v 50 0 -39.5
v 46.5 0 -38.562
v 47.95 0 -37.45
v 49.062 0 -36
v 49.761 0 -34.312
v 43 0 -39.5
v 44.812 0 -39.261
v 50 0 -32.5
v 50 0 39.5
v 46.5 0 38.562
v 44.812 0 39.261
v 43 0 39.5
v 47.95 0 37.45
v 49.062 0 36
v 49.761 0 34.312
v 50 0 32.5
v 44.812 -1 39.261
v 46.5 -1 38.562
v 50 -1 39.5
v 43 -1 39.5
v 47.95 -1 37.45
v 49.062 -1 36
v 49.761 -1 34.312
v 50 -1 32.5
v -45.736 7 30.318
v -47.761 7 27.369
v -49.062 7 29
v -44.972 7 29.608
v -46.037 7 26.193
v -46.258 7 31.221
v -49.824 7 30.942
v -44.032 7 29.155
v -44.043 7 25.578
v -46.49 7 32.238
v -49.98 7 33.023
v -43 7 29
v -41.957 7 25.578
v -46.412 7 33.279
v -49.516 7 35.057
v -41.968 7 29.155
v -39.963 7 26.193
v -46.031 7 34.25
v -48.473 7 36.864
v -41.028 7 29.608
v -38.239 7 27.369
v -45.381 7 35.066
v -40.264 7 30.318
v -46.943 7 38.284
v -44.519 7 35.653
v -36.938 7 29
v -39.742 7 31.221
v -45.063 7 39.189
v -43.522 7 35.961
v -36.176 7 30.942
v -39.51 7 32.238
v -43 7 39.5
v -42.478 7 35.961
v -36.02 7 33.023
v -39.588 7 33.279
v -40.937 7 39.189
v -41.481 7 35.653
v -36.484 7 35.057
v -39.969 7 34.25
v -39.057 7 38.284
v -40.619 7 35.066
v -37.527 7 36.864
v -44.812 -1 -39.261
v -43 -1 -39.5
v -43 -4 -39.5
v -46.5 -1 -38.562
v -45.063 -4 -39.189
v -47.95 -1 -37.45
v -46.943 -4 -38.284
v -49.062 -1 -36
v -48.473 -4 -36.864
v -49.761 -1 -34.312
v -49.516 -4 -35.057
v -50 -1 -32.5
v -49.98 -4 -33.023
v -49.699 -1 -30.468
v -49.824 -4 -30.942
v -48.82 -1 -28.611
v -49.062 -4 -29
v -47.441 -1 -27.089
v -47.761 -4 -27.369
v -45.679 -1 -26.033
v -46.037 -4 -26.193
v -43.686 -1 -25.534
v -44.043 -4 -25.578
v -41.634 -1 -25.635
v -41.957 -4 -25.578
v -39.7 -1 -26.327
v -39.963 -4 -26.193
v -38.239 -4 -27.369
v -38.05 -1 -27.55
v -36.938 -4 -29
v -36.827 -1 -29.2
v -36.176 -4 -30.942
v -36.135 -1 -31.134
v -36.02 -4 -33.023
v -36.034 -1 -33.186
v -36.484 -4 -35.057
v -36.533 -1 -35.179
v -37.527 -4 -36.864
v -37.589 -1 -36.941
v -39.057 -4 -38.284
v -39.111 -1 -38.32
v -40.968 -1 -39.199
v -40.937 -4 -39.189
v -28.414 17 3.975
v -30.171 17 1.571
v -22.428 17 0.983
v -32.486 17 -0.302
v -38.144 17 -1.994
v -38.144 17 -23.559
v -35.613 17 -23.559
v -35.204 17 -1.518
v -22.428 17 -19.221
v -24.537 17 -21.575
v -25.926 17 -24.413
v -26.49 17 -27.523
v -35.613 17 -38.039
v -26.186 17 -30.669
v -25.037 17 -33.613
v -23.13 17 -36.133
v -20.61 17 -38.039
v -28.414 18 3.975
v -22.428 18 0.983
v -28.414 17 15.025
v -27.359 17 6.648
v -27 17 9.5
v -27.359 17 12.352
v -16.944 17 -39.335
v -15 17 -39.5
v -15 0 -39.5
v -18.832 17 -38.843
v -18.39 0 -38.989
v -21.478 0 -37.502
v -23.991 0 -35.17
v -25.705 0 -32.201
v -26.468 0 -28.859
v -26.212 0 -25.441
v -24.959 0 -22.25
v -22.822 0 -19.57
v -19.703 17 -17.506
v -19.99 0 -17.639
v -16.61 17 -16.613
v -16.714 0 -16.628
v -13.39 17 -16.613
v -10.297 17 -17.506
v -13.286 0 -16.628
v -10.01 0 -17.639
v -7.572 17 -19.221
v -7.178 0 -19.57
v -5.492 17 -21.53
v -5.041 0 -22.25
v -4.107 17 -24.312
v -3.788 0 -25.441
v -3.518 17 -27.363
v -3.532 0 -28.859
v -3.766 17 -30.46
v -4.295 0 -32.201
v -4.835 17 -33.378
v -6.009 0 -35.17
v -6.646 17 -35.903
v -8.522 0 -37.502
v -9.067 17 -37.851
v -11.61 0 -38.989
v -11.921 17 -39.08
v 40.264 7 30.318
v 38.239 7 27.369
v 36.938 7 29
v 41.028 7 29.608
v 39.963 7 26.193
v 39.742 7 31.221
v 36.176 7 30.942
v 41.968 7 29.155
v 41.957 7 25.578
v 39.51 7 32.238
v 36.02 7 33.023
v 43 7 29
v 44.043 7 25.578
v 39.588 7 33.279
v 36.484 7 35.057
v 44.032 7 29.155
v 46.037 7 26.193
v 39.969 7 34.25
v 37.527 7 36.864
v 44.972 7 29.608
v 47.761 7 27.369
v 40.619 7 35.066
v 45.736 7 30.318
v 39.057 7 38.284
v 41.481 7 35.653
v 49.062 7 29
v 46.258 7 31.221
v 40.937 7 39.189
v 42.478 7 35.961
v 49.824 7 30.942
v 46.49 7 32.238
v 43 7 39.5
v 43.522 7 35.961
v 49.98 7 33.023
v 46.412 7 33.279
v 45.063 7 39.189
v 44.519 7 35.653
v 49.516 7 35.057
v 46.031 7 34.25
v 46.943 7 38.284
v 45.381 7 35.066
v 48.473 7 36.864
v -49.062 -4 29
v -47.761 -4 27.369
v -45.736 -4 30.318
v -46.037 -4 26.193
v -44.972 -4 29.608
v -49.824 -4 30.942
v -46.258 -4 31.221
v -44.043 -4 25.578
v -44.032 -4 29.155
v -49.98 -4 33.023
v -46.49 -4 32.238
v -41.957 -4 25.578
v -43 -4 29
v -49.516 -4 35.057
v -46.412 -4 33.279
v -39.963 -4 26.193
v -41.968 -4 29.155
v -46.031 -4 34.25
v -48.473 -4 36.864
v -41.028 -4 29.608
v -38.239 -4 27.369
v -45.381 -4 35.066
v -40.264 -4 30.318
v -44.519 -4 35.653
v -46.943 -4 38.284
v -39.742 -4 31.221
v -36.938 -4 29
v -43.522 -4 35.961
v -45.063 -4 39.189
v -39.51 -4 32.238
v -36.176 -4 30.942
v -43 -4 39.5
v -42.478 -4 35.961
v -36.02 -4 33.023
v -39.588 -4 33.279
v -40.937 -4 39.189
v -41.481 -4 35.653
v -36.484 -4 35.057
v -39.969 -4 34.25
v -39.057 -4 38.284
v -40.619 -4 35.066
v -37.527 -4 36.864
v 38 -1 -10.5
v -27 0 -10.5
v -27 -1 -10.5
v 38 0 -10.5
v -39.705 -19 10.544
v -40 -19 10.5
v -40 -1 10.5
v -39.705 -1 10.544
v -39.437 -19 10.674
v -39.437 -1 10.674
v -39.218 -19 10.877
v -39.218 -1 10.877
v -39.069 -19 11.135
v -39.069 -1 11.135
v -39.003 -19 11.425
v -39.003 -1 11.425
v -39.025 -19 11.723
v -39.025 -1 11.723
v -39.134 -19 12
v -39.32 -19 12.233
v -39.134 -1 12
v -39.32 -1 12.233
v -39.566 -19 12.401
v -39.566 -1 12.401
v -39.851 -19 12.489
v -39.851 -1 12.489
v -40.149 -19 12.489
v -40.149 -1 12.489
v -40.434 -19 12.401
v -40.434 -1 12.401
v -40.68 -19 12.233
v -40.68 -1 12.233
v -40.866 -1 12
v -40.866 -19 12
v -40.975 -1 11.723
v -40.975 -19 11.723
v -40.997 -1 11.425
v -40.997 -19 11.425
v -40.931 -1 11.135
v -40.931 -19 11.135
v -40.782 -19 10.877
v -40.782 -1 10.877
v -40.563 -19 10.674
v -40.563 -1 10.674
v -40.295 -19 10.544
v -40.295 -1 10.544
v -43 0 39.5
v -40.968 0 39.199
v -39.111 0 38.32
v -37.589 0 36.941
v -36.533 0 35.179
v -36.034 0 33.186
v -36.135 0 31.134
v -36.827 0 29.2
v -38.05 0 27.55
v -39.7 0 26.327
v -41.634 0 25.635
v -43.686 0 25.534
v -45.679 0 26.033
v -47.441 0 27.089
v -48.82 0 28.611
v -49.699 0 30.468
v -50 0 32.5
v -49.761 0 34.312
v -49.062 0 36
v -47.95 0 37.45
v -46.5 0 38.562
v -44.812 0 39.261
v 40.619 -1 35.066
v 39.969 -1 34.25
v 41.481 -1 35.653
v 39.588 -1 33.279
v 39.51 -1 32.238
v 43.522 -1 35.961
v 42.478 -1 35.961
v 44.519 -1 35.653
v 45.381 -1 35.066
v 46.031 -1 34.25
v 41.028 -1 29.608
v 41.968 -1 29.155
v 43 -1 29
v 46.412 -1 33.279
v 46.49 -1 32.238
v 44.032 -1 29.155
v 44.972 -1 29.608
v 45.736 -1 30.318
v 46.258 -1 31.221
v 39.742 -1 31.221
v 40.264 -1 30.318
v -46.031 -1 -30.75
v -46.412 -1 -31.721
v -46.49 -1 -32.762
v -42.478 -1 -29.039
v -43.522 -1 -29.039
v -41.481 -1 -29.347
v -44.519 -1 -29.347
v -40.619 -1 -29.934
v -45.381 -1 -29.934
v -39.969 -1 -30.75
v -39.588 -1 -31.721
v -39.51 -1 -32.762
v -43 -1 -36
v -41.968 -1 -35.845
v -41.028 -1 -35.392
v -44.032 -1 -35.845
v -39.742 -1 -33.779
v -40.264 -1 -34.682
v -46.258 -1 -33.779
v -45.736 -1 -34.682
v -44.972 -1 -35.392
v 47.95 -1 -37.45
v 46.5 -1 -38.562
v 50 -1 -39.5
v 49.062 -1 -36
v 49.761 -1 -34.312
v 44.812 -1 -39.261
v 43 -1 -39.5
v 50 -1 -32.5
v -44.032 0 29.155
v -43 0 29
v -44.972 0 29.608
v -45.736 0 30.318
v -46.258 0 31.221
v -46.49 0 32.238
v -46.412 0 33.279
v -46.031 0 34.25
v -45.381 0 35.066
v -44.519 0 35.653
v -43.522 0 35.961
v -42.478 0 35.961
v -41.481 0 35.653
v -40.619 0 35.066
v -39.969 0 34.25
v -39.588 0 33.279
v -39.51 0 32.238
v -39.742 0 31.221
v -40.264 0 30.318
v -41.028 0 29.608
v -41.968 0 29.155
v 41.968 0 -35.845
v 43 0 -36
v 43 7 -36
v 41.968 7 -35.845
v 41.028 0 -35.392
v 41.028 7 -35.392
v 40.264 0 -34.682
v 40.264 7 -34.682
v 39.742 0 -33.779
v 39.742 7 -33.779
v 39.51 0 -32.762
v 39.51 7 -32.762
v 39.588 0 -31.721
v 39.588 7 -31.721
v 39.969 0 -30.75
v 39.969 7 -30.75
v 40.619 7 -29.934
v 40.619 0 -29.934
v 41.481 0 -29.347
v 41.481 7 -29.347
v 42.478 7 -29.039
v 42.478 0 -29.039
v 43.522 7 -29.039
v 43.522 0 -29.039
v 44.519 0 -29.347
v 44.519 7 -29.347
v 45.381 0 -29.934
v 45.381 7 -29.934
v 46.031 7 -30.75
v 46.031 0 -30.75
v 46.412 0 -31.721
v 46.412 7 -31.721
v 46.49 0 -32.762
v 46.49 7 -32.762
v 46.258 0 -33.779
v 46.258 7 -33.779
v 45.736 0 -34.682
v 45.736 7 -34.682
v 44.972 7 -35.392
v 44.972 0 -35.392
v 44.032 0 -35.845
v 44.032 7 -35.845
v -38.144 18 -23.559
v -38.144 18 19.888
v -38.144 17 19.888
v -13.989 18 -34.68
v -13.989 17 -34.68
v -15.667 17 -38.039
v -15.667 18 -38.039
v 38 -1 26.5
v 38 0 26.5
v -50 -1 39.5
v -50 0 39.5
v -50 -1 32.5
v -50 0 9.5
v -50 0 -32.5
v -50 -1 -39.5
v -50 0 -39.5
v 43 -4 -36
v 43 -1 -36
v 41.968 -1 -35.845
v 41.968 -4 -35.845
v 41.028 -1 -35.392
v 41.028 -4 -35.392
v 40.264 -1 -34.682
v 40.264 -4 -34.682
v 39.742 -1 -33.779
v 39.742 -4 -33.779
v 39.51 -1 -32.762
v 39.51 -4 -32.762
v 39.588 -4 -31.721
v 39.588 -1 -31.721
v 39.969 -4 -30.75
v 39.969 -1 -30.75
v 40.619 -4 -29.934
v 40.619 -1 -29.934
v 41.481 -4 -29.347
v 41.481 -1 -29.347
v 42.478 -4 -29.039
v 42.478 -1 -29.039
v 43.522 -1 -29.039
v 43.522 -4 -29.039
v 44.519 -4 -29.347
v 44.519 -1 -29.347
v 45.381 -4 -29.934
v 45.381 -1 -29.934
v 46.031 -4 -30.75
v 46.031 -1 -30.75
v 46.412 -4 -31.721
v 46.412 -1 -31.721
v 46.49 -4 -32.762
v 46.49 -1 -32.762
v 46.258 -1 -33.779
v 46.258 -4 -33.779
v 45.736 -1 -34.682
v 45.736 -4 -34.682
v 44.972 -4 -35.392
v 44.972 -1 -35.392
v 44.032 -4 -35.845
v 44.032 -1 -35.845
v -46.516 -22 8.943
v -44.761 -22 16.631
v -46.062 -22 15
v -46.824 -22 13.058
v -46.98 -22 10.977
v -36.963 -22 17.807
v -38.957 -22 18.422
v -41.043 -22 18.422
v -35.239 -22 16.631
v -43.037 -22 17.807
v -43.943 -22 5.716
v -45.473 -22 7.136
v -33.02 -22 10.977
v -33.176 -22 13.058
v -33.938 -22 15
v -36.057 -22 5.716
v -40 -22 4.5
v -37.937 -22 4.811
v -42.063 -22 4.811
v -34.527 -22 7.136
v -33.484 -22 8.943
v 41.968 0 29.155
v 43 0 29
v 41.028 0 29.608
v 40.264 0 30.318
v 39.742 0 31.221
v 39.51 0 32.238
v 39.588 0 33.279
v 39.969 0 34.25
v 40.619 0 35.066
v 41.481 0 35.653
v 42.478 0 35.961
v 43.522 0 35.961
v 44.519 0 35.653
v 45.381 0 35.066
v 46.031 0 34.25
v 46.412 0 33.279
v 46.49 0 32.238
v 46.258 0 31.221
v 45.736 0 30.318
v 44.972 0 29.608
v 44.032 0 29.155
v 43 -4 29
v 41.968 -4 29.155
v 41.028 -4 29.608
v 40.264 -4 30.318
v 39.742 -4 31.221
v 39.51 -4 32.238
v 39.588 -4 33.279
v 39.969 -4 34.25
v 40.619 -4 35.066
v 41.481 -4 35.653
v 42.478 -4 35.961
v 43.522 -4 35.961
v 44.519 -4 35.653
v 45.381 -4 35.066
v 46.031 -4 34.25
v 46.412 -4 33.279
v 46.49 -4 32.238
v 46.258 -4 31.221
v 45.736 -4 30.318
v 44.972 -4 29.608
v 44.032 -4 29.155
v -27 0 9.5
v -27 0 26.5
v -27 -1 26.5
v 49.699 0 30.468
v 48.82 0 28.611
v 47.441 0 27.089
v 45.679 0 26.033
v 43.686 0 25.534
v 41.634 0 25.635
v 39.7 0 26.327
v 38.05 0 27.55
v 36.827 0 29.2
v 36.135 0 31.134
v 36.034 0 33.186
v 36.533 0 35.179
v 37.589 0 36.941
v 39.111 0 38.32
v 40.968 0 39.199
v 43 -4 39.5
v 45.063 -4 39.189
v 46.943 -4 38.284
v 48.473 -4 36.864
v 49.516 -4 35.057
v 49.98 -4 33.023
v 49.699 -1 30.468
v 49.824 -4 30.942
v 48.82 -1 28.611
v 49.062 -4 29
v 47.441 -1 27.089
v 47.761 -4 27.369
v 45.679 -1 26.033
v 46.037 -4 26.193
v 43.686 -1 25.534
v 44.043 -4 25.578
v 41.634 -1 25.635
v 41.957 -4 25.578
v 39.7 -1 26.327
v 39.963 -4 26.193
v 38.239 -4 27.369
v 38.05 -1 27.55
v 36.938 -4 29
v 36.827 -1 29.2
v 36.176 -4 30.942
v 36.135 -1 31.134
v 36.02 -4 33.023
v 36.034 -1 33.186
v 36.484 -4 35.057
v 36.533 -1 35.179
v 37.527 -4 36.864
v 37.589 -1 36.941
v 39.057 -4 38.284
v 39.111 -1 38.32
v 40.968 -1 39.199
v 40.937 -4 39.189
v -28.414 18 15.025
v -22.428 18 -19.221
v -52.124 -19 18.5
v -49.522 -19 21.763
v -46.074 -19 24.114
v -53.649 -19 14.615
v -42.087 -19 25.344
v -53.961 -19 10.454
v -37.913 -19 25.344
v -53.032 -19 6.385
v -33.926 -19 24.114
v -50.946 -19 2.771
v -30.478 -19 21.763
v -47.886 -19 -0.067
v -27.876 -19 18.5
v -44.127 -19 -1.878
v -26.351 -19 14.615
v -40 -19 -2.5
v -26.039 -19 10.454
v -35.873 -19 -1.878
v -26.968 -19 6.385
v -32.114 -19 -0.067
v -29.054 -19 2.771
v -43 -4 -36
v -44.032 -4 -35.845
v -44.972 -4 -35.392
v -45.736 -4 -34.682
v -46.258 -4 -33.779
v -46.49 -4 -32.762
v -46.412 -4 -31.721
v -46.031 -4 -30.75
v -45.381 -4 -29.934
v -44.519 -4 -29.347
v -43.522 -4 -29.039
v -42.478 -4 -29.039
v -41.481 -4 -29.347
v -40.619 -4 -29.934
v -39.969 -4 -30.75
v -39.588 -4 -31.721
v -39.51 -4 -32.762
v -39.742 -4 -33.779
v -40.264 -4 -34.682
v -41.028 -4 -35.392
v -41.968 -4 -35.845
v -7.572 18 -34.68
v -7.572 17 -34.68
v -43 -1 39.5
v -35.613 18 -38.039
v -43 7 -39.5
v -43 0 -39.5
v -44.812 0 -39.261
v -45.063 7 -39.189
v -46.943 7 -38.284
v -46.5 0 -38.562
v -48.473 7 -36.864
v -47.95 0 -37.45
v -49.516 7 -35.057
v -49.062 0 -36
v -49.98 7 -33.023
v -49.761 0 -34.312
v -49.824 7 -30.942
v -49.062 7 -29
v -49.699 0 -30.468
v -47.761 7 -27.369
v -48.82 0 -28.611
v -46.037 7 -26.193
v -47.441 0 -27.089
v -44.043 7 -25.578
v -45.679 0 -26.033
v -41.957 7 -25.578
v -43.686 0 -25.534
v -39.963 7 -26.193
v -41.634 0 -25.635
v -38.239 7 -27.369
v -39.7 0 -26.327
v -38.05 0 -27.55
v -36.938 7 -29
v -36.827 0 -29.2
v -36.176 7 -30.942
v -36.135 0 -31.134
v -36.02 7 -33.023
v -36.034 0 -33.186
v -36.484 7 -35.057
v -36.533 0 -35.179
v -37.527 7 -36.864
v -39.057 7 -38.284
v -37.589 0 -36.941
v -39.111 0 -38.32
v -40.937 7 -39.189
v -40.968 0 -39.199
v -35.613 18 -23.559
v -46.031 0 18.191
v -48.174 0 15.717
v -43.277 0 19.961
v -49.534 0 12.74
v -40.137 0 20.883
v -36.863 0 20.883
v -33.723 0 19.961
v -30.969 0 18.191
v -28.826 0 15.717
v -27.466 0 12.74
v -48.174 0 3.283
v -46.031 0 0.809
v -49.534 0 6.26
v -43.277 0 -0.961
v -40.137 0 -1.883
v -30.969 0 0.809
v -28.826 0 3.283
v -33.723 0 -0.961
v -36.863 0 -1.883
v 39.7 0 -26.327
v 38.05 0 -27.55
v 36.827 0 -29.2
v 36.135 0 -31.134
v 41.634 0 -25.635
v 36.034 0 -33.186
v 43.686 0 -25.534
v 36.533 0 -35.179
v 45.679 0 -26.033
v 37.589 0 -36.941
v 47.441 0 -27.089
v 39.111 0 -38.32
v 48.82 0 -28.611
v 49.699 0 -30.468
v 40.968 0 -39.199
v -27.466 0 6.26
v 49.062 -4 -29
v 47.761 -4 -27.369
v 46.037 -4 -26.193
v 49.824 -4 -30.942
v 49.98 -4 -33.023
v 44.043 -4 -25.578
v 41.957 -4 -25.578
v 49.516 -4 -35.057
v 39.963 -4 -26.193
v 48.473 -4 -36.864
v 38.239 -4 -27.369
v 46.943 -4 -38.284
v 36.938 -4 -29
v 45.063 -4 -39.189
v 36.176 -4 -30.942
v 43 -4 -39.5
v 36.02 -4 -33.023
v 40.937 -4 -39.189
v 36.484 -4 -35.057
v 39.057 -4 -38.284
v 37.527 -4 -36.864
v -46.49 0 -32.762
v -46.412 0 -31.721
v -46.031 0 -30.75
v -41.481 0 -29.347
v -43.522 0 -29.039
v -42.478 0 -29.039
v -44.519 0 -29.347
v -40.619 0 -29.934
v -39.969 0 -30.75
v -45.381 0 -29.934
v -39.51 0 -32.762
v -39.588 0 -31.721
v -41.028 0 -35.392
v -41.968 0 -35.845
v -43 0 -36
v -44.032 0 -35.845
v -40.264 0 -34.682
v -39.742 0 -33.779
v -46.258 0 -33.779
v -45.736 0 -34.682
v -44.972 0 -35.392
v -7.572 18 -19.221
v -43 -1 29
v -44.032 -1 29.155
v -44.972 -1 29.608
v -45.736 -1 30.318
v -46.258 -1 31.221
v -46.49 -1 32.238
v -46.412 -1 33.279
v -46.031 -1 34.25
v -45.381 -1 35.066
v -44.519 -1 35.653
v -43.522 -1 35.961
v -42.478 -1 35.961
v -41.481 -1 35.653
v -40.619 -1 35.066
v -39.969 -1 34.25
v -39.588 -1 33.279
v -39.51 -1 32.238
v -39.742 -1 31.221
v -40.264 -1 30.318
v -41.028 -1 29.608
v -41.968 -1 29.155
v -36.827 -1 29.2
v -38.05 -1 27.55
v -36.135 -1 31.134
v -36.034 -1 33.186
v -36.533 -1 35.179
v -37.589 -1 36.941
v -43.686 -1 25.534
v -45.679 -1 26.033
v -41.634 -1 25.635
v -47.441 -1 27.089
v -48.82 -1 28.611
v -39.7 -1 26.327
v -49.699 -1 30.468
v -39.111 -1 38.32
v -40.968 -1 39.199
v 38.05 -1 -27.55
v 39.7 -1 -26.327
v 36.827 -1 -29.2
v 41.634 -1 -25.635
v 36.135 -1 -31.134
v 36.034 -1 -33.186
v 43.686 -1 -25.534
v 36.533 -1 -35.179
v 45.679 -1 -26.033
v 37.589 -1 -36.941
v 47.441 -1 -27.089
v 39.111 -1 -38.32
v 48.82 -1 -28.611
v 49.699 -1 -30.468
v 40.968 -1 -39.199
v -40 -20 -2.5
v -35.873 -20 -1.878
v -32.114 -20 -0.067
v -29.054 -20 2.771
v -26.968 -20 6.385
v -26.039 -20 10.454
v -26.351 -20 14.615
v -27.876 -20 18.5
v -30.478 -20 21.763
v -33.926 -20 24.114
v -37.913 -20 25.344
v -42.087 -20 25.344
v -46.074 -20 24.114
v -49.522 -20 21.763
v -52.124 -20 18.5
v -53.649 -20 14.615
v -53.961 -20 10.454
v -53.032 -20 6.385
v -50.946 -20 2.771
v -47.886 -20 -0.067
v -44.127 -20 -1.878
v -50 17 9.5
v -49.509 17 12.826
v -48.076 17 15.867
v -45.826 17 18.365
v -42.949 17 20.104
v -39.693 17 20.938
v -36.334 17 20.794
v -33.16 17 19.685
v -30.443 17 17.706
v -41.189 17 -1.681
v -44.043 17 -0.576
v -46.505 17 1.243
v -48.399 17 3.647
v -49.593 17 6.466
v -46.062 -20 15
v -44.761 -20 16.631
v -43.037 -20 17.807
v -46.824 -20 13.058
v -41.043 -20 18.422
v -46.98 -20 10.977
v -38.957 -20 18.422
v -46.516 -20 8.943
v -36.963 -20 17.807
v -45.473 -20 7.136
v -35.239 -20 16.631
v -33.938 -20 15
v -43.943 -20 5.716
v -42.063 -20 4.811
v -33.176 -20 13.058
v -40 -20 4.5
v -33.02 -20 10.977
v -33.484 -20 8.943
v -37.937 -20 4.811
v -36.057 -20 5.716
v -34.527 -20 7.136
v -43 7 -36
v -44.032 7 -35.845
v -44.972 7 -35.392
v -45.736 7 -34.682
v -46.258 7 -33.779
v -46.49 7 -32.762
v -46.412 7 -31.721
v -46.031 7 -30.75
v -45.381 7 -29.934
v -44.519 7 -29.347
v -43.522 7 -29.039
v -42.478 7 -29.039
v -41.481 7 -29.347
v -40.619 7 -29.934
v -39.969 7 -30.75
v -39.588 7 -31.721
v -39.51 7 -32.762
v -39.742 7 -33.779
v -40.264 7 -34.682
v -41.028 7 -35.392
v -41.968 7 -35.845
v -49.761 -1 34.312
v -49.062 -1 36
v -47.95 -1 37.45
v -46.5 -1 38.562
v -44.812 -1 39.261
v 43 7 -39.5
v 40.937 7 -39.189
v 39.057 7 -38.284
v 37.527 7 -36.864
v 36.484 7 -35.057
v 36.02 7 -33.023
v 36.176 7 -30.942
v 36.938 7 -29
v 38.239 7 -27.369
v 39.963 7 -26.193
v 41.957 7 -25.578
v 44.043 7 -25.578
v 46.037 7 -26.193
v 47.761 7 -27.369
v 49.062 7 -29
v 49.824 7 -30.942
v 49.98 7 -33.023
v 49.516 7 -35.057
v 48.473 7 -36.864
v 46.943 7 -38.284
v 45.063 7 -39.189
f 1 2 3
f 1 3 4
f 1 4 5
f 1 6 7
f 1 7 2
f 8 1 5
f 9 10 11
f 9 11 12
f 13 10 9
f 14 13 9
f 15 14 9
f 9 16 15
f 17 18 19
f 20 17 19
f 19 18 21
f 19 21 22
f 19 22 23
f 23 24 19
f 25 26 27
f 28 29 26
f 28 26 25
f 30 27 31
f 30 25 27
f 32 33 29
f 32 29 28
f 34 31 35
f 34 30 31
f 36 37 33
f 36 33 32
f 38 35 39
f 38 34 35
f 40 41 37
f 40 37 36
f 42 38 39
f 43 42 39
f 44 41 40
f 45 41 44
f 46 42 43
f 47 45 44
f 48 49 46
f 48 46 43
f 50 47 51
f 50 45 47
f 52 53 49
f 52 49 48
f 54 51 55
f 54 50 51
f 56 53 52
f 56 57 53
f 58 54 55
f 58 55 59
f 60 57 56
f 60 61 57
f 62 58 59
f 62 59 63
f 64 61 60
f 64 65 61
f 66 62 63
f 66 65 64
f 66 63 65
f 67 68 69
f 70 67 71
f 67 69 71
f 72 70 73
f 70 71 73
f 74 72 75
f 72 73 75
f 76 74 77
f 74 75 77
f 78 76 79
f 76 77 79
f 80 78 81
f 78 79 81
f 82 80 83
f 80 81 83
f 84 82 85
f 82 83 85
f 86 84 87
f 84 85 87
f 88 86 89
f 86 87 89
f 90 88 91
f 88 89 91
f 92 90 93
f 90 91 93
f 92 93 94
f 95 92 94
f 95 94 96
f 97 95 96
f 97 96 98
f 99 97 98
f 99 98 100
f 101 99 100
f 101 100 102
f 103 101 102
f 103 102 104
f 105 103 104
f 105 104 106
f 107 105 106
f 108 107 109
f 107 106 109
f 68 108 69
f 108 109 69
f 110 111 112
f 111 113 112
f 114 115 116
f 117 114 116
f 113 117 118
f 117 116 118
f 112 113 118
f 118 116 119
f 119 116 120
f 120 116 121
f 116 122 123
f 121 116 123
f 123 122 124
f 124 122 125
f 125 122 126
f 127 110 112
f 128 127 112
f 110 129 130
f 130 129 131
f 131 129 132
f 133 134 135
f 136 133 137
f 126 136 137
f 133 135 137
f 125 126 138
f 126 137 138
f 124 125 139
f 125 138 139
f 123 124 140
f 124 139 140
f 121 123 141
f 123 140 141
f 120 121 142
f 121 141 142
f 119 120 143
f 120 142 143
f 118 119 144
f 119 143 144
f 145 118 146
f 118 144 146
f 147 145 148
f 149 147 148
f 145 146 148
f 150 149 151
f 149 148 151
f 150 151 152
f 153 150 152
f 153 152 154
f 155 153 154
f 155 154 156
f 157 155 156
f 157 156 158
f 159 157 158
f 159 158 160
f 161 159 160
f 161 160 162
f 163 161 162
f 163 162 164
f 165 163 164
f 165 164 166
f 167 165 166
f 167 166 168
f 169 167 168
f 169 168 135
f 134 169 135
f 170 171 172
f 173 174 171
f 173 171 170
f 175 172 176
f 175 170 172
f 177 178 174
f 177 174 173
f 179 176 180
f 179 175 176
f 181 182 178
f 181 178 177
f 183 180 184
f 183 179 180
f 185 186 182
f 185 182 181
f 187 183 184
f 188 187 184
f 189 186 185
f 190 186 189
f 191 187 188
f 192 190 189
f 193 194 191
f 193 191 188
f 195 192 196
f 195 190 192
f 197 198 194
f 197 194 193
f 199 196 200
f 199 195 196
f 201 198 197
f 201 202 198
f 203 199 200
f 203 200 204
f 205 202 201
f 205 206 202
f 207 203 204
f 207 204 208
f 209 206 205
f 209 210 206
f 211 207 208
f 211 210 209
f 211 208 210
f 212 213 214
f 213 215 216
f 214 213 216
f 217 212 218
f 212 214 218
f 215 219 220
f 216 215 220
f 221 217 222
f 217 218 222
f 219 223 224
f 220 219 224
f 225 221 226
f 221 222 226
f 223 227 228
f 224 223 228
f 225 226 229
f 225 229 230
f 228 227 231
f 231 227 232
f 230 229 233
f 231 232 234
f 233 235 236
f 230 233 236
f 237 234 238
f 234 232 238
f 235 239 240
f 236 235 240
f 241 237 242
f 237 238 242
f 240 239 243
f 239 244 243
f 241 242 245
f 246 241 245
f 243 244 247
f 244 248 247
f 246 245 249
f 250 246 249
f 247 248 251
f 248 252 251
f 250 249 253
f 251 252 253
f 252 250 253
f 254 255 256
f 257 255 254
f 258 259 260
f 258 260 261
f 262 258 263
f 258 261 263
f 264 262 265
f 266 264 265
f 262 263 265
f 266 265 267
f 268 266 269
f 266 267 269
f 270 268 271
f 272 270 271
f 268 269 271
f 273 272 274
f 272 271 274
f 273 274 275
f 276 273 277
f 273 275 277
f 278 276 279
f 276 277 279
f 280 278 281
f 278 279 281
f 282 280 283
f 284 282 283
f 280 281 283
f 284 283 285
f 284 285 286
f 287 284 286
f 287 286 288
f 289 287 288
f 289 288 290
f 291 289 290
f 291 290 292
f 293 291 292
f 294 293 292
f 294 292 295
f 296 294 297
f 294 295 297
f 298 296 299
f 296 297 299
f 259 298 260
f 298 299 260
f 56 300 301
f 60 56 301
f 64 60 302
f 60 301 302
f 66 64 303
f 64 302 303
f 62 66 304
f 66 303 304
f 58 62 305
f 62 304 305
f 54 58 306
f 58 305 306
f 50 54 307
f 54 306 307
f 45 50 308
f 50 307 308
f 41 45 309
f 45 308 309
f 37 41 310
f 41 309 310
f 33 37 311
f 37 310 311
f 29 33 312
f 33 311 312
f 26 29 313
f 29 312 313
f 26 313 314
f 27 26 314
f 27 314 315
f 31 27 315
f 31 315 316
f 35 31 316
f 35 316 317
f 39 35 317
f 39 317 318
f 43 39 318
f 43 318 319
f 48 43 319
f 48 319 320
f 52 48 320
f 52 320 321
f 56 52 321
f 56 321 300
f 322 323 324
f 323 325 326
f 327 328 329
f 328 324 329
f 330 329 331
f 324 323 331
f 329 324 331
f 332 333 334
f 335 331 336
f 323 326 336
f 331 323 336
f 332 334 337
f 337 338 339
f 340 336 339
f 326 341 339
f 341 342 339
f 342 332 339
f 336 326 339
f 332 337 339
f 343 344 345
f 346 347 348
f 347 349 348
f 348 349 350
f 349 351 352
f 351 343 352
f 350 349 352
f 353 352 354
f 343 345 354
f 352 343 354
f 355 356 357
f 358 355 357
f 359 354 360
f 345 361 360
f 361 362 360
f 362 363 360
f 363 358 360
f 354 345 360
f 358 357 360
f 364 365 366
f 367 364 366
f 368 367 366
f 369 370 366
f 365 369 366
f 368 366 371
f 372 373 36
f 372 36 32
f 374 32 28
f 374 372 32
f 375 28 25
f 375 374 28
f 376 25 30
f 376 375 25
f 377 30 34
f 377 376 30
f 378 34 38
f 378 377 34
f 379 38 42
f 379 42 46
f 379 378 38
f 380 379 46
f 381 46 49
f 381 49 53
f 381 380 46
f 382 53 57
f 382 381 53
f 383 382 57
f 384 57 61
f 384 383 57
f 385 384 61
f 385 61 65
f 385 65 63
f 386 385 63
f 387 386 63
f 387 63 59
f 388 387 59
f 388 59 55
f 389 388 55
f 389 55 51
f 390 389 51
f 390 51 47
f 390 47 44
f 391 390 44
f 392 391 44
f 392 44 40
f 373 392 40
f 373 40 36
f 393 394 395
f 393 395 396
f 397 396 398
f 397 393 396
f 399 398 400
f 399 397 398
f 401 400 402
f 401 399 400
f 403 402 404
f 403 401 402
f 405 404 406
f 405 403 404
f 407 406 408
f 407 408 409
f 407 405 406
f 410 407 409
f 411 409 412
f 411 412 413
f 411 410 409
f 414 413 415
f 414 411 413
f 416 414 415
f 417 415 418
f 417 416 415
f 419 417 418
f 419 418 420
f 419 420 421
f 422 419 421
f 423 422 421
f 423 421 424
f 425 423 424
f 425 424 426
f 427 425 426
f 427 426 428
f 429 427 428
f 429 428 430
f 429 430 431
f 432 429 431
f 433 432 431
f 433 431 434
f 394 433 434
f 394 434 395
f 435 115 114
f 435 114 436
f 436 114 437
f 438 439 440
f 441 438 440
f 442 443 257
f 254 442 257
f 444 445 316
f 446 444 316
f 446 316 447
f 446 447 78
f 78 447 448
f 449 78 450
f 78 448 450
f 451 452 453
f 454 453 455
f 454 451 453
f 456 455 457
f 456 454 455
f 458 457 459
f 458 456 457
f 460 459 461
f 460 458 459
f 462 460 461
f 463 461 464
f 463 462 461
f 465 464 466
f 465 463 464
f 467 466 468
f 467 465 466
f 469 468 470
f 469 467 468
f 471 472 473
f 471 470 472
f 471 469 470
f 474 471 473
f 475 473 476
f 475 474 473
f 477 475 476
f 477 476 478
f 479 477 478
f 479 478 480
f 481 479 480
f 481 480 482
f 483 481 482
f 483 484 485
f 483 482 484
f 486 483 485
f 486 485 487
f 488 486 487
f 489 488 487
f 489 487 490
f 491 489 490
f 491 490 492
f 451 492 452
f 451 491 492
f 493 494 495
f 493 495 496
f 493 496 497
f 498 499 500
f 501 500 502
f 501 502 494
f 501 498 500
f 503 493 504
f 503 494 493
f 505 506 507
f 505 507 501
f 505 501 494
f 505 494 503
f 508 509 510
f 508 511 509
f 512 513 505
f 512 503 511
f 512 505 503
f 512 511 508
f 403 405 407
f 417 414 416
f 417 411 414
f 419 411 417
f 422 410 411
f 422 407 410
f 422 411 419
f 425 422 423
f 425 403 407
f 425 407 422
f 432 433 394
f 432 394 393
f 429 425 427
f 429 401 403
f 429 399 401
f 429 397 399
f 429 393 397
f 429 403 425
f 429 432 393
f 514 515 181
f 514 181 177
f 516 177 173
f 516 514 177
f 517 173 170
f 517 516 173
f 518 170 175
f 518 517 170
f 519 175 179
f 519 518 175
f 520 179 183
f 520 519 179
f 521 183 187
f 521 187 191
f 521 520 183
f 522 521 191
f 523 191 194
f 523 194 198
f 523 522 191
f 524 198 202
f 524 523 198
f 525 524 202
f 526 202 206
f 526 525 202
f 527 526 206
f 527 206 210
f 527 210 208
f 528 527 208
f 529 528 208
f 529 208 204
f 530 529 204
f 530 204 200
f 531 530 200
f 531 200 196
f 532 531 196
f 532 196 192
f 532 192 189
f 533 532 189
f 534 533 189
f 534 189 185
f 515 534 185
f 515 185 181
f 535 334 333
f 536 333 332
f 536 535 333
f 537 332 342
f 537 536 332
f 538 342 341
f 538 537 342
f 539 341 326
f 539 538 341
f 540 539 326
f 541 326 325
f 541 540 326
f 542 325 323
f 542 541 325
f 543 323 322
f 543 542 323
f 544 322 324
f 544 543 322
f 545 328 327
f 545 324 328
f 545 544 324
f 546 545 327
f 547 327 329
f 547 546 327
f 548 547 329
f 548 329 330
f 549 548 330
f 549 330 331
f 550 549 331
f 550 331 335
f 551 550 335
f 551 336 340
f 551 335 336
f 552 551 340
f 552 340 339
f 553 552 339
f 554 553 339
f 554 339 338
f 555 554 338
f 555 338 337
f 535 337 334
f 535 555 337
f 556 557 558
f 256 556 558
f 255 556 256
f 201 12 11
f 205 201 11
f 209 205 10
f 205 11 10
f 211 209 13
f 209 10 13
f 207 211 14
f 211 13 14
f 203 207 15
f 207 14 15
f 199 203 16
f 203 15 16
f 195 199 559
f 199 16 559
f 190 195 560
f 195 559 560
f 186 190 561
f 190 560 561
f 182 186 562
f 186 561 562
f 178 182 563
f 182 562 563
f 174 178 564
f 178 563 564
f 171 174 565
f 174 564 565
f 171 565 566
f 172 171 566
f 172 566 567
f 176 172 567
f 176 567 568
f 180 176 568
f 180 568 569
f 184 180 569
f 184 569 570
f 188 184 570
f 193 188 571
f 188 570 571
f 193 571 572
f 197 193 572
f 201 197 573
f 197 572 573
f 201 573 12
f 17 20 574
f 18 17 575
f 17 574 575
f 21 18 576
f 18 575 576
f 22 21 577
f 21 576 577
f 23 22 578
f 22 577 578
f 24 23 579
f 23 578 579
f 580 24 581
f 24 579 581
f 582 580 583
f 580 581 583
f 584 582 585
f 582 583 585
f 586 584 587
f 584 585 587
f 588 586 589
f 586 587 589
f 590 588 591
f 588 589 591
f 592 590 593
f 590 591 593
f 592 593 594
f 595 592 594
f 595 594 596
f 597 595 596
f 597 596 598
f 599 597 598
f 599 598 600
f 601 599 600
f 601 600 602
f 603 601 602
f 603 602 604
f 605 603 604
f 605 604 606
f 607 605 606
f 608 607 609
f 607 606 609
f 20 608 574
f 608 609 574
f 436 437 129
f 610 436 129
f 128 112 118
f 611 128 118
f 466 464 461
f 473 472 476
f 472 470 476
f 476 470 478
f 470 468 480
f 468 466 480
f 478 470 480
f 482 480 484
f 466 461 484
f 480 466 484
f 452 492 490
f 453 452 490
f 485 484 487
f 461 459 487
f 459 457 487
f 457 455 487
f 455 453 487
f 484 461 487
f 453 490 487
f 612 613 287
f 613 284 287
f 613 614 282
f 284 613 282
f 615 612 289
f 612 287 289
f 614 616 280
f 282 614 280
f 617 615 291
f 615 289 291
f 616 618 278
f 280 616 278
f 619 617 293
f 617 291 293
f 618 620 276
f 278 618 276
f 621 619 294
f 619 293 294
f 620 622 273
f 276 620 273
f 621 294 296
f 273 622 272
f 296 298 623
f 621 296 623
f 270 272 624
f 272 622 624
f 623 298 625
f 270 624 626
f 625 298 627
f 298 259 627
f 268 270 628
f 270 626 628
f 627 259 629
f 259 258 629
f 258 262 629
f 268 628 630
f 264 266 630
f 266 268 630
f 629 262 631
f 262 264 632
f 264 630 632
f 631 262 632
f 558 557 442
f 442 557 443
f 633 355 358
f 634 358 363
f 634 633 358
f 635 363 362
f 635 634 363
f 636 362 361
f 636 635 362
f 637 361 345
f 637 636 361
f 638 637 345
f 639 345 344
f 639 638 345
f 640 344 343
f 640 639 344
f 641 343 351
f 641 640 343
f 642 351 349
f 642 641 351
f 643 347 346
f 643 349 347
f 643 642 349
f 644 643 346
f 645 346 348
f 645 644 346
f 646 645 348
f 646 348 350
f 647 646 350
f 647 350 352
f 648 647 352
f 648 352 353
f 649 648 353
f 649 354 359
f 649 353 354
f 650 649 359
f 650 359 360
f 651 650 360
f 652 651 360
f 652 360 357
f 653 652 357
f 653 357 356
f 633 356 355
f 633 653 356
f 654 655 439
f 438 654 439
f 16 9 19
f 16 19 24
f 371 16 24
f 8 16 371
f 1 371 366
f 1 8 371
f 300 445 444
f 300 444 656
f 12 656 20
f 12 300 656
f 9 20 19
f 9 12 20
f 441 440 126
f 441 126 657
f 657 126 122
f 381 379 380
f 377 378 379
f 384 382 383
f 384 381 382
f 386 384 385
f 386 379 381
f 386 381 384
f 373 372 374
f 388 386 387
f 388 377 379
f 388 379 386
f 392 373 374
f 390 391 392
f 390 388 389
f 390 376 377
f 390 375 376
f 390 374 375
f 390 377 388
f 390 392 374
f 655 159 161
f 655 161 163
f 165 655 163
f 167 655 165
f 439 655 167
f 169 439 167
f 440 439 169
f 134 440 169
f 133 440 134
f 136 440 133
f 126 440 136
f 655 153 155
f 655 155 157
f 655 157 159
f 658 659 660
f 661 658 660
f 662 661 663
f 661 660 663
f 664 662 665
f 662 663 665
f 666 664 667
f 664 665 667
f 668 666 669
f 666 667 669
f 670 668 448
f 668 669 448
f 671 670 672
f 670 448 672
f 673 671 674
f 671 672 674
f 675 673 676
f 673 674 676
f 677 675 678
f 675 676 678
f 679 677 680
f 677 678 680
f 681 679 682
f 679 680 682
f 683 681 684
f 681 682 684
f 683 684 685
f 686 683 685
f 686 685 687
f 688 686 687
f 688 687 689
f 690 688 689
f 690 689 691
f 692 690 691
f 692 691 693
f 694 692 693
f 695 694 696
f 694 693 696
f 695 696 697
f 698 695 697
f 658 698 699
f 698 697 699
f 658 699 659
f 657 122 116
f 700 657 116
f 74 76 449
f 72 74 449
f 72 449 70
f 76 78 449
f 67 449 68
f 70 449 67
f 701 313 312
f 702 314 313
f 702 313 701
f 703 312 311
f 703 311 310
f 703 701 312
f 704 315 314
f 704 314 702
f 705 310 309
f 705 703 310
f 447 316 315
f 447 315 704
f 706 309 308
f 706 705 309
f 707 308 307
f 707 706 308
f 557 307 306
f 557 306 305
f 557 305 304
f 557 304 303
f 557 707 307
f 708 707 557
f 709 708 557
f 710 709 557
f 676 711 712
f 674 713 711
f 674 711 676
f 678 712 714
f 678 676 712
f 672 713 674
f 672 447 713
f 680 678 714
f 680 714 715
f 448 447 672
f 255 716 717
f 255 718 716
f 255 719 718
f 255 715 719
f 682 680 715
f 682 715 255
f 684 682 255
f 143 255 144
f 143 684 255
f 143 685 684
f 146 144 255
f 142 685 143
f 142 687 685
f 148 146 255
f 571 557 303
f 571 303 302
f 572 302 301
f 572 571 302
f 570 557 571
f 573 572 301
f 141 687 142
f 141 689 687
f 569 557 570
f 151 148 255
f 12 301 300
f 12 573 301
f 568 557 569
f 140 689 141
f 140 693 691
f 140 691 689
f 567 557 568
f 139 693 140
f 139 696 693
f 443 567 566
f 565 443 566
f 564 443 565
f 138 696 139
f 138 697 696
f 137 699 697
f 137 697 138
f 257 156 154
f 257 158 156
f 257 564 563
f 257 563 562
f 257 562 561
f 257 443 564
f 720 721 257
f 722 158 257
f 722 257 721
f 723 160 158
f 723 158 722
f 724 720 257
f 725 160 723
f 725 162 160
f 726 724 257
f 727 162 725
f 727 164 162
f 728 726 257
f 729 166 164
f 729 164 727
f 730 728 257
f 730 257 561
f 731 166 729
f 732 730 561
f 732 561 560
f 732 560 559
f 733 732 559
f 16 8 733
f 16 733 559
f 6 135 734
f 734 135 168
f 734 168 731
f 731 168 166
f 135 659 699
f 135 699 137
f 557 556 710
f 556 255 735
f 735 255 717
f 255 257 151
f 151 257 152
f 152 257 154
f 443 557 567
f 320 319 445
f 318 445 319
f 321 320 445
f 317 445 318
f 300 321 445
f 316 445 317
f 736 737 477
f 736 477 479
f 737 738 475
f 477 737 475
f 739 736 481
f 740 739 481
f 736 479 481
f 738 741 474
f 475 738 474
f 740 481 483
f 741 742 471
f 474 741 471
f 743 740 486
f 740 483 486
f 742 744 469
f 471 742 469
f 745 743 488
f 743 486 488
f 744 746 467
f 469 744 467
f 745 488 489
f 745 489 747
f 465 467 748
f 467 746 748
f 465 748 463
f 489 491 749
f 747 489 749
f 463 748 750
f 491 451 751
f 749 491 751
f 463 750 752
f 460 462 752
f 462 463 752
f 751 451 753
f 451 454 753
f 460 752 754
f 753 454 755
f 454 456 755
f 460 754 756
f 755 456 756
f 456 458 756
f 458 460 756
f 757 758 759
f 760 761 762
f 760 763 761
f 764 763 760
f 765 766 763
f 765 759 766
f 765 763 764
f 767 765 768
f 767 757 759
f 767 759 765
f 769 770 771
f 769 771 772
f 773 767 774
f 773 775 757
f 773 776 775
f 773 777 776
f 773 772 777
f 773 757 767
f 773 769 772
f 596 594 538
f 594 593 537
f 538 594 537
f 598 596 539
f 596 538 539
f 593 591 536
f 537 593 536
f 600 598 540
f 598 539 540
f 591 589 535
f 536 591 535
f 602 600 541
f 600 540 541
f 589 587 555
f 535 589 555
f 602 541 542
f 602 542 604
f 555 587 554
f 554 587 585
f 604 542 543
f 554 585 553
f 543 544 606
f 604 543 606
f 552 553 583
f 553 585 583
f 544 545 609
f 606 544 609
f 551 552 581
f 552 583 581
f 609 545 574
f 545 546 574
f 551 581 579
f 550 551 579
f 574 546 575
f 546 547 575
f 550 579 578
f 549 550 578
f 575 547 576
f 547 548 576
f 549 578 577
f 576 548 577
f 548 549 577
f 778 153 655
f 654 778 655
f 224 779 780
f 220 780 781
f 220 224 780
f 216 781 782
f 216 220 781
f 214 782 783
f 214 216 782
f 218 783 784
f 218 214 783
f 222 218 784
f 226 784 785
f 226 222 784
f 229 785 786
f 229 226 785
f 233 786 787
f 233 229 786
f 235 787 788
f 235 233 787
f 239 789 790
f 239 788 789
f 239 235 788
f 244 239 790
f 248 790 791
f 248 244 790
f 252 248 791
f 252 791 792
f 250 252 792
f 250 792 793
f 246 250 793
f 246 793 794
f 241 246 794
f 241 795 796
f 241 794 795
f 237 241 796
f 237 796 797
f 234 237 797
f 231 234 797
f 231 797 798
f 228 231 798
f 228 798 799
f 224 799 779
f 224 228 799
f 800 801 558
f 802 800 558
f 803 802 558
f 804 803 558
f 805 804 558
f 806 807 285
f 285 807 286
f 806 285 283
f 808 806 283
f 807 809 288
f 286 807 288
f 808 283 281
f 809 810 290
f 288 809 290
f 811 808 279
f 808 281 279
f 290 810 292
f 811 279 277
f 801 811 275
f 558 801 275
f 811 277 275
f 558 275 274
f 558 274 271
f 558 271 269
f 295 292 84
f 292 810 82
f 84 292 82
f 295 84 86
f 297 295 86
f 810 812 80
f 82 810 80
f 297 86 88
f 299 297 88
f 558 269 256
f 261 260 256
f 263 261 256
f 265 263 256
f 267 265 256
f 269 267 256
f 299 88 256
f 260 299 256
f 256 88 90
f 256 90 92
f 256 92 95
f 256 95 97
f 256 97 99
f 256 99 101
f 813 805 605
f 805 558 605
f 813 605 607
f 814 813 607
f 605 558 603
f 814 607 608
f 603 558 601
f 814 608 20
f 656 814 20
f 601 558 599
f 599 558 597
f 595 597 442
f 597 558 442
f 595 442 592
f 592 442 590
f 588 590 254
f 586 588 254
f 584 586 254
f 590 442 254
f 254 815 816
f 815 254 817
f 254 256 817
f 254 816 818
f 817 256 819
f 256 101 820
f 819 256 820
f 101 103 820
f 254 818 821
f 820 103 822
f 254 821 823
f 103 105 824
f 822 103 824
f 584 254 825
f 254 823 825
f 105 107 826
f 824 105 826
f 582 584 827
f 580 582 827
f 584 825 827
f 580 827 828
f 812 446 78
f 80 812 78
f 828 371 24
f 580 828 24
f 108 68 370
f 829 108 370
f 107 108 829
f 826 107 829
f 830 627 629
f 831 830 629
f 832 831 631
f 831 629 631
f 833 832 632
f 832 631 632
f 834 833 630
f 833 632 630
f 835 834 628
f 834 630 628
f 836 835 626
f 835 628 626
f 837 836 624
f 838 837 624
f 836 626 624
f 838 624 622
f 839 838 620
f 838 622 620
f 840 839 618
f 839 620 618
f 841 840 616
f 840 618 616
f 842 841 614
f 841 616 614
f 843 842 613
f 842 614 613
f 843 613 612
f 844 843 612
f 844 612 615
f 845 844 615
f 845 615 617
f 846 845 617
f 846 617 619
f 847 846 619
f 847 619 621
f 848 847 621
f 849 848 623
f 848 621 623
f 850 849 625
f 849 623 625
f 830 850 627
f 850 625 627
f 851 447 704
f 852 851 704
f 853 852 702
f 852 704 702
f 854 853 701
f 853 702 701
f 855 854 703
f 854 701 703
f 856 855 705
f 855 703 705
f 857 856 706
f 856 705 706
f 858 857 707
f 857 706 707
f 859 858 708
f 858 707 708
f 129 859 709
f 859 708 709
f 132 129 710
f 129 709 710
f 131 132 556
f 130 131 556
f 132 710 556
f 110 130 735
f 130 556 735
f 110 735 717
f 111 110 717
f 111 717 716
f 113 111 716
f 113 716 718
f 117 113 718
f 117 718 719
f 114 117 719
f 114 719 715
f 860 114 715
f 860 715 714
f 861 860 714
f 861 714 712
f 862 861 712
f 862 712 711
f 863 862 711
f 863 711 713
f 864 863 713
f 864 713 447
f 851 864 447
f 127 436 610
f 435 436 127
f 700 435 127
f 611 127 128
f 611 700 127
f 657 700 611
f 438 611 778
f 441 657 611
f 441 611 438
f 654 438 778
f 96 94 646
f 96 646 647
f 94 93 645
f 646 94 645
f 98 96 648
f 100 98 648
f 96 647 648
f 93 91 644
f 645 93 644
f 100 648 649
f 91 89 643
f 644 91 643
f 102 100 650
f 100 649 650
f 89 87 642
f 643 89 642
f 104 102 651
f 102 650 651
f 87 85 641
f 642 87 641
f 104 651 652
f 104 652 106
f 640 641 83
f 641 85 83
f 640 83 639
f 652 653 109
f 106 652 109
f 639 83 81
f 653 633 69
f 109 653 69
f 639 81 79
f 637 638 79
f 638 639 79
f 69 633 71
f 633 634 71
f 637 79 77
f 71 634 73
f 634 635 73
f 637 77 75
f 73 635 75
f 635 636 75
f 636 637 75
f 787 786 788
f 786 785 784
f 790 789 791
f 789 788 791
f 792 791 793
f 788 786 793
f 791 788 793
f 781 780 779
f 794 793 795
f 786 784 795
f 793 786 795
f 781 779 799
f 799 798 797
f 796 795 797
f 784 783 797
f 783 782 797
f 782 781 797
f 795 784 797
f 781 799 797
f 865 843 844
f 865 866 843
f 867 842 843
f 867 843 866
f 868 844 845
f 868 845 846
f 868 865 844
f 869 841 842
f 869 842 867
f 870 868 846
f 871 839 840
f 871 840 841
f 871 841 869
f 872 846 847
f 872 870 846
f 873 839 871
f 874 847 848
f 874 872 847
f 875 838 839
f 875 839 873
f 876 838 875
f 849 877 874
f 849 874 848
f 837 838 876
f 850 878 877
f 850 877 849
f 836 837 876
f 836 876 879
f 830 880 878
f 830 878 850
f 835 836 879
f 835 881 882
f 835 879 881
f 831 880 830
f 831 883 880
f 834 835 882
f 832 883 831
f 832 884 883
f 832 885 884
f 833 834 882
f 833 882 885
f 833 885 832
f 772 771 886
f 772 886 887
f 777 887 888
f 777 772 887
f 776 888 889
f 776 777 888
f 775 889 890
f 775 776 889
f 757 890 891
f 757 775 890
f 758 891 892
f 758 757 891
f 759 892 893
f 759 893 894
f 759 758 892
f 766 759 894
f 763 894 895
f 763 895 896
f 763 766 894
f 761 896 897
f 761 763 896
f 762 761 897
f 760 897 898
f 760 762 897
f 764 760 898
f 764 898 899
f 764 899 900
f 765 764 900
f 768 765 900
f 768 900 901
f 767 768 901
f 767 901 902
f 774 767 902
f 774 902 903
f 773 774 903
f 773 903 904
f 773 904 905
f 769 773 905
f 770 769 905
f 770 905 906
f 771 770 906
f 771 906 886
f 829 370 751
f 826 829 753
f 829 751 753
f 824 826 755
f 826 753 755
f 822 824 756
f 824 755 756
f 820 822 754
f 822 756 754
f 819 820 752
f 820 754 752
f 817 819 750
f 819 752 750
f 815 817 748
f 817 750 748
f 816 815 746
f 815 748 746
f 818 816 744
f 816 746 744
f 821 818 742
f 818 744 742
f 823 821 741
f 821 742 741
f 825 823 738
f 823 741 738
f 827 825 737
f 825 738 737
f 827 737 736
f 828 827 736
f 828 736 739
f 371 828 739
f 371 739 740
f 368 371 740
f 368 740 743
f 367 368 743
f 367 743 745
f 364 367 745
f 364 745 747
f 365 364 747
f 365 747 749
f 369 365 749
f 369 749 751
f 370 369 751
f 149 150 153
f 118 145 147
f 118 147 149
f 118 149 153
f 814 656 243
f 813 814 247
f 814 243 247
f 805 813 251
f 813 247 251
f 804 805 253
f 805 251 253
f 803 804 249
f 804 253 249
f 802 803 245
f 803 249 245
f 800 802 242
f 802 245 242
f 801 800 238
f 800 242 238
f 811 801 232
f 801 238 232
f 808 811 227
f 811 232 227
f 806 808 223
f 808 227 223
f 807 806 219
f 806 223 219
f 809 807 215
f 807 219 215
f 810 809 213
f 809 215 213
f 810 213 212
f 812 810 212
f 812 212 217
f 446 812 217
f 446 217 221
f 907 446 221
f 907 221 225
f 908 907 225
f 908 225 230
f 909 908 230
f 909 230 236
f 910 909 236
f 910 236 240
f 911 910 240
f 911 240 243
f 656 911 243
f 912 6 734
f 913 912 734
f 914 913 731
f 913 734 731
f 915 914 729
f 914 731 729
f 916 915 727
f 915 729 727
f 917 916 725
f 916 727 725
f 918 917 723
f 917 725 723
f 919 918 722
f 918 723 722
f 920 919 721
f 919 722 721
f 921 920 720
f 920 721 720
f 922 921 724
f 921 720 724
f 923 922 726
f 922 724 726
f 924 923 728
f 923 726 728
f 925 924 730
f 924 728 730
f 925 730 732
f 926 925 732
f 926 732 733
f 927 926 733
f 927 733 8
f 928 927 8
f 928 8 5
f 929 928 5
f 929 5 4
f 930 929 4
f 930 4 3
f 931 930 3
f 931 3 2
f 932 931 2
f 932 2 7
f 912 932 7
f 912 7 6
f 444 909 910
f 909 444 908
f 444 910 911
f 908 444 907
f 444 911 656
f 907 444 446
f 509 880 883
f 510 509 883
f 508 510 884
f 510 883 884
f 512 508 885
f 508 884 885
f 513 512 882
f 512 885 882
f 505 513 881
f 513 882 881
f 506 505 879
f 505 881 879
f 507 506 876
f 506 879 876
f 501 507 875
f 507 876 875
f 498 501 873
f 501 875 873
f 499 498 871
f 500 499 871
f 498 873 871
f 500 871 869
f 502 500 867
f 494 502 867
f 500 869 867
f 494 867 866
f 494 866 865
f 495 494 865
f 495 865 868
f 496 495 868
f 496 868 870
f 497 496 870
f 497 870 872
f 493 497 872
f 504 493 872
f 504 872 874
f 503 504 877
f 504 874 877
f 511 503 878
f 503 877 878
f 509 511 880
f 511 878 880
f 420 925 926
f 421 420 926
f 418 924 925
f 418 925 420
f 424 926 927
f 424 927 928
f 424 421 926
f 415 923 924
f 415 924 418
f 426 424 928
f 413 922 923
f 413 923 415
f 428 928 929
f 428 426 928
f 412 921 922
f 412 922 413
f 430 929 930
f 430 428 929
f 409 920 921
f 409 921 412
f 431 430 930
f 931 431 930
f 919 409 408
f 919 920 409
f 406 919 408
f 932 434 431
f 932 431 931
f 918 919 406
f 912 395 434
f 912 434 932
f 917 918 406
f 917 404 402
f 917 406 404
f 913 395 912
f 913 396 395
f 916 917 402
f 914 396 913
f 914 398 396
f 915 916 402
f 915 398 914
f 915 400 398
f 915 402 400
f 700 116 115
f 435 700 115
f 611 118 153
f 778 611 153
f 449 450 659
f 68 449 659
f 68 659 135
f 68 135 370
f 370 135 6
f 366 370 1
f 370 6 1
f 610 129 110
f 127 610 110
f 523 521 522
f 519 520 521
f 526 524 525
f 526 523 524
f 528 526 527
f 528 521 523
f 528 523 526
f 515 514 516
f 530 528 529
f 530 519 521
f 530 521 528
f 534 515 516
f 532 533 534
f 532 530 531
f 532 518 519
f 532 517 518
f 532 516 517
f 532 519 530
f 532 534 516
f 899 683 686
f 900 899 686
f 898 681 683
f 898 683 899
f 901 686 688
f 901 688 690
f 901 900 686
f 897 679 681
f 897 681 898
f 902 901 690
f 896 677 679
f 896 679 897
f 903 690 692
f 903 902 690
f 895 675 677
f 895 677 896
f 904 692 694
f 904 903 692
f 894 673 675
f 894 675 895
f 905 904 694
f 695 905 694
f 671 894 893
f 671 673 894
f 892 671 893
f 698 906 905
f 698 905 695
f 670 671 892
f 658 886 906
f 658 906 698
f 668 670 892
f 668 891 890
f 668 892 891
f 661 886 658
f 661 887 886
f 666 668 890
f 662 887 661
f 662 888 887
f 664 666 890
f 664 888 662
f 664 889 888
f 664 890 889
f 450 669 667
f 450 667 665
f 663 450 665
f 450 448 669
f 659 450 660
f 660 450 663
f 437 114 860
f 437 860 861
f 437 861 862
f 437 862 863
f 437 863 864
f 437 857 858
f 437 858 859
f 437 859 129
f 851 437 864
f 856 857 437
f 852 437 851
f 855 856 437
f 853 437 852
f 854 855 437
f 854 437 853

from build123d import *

# Parameters (mm, degrees)
ESQUISSE4_W             = 100
ESQUISSE4_H             = 79
BOSS_EXTRU_3_DEPTH      = 1
BOSS_EXTRU_4_DEPTH      = 7
BOSS_EXTRU_4_DEPTH_BACK = 4
ESQUISSE1_R             = 7
ESQUISSE1_R_2           = 3.5
ESQUISSE6_R             = 11.5
BOSS_EXTRU_5_DEPTH      = 17
BOSS_EXTRU_6_DEPTH      = 1
ESQUISSE8_W             = 65
ESQUISSE8_H             = 37
ENL_V_MAT_EXTRU_1_DEPTH = 1
ESQUISSE9_R             = 1
BOSS_EXTRU_7_DEPTH      = 18
ESQUISSE10_R            = 14
BOSS_EXTRU_8_DEPTH      = 1
ESQUISSE11_R            = 7
BOSS_EXTRU_9_DEPTH      = 2


with BuildPart() as part:
    # Esquisse4 → Boss.-Extru.3 (new body)
    with BuildSketch(Plane(origin=(0, 0, 0), x_dir=(1, 0, 0), z_dir=(0, 1, 0))):
        Rectangle(ESQUISSE4_W, ESQUISSE4_H)
    extrude(amount=-BOSS_EXTRU_3_DEPTH)

    # Esquisse1 → Boss.-Extru.4 (add, two sides: drawn at the far end of the back side and taken through both)
    # profile 1 of 4: a face of its own
    with BuildSketch(Plane(origin=(0, 0, 0), x_dir=(1, 0, 0), z_dir=(0, 1, 0)).offset(-BOSS_EXTRU_4_DEPTH_BACK)):
        with Locations(Location((43, 32.5, 0), (0, 0, 90))):
            Circle(ESQUISSE1_R)
        with Locations(Location((43, 32.5, 0), (0, 0, 90))):
            Circle(ESQUISSE1_R_2, mode=Mode.SUBTRACT)
    # profile 2 of 4: a face of its own
    with BuildSketch(Plane(origin=(0, 0, 0), x_dir=(1, 0, 0), z_dir=(0, 1, 0)).offset(-BOSS_EXTRU_4_DEPTH_BACK)):
        with Locations(Location((-43, 32.5, 0), (0, 0, 90))):
            Circle(ESQUISSE1_R)
        with Locations(Location((-43, 32.5, 0), (0, 0, 90))):
            Circle(ESQUISSE1_R_2, mode=Mode.SUBTRACT)
    # profile 3 of 4: a face of its own
    with BuildSketch(Plane(origin=(0, 0, 0), x_dir=(1, 0, 0), z_dir=(0, 1, 0)).offset(-BOSS_EXTRU_4_DEPTH_BACK)):
        with Locations(Location((-43, -32.5, 0), (0, 0, 270))):
            Circle(ESQUISSE1_R)
        with Locations(Location((-43, -32.5, 0), (0, 0, 90))):
            Circle(ESQUISSE1_R_2, mode=Mode.SUBTRACT)
    # profile 4 of 4: a face of its own
    with BuildSketch(Plane(origin=(0, 0, 0), x_dir=(1, 0, 0), z_dir=(0, 1, 0)).offset(-BOSS_EXTRU_4_DEPTH_BACK)):
        with Locations(Location((43, -32.5, 0), (0, 0, 270))):
            Circle(ESQUISSE1_R)
        with Locations(Location((43, -32.5, 0), (0, 0, 90))):
            Circle(ESQUISSE1_R_2, mode=Mode.SUBTRACT)
    extrude(amount=BOSS_EXTRU_4_DEPTH + BOSS_EXTRU_4_DEPTH_BACK)

    # Esquisse6 → Boss.-Extru.5 (add)
    with BuildSketch(Plane(origin=(0, 0, 0), x_dir=(1, 0, 0), z_dir=(0, 1, 0))):
        with Locations(Location((-38.5, -9.5, 0), (0, 0, 180))):
            Circle(ESQUISSE6_R)
        with Locations(Location((-15, 28, 0), (0, 0, 90))):
            Circle(ESQUISSE6_R)
    extrude(amount=BOSS_EXTRU_5_DEPTH)

    # Esquisse7 → Boss.-Extru.6 (add)
    with BuildSketch(Plane(origin=(0, 17, 0), x_dir=(1, 0, 0), z_dir=(0, 1, 0))):
        Polygon((-38.143774149, -19.88751618), (-28.414215556, -15.025120102), (-28.414215556, -3.974879898), (-22.428299765, -0.98338823), (-22.428299765, 19.221027247), (-7.571700235, 19.221027247), (-7.571700235, 34.680148422), (-13.988712335, 34.680148422), (-15.667356388, 38.039082045), (-35.613243864, 38.039082045), (-35.613243864, 23.559466539), (-38.143774149, 23.559466539), (-38.143774149, 0), align=None)
    extrude(amount=BOSS_EXTRU_6_DEPTH)

    # Esquisse8 → Enlèv. mat.-Extru.1 (cut)
    with BuildSketch(Plane(origin=(0, 0, 0), x_dir=(1, 0, 0), z_dir=(0, 1, 0))):
        with Locations((5.5, -8)):
            Rectangle(ESQUISSE8_W, ESQUISSE8_H)
    extrude(amount=-ENL_V_MAT_EXTRU_1_DEPTH, mode=Mode.SUBTRACT)

    # Esquisse9 → Boss.-Extru.7 (add)
    with BuildSketch(Plane.XZ.offset(1)):
        with Locations(Location((-40, 11.5, 0), (0, 0, 270))):
            Circle(ESQUISSE9_R)
    extrude(amount=BOSS_EXTRU_7_DEPTH)

    # Esquisse10 → Boss.-Extru.8 (add)
    with BuildSketch(Plane.XZ.offset(19)):
        with Locations(Location((-40, 11.5, 0), (0, 0, 270))):
            Circle(ESQUISSE10_R)
    extrude(amount=BOSS_EXTRU_8_DEPTH)

    # Esquisse11 → Boss.-Extru.9 (add)
    with BuildSketch(Plane(origin=(0, -20, 0), x_dir=(-1, 0, 0), z_dir=(0, -1, 0))):
        with Locations(Location((40, -11.5, 0), (0, 0, 90))):
            Circle(ESQUISSE11_R)
    extrude(amount=BOSS_EXTRU_9_DEPTH)


solid = part.part
